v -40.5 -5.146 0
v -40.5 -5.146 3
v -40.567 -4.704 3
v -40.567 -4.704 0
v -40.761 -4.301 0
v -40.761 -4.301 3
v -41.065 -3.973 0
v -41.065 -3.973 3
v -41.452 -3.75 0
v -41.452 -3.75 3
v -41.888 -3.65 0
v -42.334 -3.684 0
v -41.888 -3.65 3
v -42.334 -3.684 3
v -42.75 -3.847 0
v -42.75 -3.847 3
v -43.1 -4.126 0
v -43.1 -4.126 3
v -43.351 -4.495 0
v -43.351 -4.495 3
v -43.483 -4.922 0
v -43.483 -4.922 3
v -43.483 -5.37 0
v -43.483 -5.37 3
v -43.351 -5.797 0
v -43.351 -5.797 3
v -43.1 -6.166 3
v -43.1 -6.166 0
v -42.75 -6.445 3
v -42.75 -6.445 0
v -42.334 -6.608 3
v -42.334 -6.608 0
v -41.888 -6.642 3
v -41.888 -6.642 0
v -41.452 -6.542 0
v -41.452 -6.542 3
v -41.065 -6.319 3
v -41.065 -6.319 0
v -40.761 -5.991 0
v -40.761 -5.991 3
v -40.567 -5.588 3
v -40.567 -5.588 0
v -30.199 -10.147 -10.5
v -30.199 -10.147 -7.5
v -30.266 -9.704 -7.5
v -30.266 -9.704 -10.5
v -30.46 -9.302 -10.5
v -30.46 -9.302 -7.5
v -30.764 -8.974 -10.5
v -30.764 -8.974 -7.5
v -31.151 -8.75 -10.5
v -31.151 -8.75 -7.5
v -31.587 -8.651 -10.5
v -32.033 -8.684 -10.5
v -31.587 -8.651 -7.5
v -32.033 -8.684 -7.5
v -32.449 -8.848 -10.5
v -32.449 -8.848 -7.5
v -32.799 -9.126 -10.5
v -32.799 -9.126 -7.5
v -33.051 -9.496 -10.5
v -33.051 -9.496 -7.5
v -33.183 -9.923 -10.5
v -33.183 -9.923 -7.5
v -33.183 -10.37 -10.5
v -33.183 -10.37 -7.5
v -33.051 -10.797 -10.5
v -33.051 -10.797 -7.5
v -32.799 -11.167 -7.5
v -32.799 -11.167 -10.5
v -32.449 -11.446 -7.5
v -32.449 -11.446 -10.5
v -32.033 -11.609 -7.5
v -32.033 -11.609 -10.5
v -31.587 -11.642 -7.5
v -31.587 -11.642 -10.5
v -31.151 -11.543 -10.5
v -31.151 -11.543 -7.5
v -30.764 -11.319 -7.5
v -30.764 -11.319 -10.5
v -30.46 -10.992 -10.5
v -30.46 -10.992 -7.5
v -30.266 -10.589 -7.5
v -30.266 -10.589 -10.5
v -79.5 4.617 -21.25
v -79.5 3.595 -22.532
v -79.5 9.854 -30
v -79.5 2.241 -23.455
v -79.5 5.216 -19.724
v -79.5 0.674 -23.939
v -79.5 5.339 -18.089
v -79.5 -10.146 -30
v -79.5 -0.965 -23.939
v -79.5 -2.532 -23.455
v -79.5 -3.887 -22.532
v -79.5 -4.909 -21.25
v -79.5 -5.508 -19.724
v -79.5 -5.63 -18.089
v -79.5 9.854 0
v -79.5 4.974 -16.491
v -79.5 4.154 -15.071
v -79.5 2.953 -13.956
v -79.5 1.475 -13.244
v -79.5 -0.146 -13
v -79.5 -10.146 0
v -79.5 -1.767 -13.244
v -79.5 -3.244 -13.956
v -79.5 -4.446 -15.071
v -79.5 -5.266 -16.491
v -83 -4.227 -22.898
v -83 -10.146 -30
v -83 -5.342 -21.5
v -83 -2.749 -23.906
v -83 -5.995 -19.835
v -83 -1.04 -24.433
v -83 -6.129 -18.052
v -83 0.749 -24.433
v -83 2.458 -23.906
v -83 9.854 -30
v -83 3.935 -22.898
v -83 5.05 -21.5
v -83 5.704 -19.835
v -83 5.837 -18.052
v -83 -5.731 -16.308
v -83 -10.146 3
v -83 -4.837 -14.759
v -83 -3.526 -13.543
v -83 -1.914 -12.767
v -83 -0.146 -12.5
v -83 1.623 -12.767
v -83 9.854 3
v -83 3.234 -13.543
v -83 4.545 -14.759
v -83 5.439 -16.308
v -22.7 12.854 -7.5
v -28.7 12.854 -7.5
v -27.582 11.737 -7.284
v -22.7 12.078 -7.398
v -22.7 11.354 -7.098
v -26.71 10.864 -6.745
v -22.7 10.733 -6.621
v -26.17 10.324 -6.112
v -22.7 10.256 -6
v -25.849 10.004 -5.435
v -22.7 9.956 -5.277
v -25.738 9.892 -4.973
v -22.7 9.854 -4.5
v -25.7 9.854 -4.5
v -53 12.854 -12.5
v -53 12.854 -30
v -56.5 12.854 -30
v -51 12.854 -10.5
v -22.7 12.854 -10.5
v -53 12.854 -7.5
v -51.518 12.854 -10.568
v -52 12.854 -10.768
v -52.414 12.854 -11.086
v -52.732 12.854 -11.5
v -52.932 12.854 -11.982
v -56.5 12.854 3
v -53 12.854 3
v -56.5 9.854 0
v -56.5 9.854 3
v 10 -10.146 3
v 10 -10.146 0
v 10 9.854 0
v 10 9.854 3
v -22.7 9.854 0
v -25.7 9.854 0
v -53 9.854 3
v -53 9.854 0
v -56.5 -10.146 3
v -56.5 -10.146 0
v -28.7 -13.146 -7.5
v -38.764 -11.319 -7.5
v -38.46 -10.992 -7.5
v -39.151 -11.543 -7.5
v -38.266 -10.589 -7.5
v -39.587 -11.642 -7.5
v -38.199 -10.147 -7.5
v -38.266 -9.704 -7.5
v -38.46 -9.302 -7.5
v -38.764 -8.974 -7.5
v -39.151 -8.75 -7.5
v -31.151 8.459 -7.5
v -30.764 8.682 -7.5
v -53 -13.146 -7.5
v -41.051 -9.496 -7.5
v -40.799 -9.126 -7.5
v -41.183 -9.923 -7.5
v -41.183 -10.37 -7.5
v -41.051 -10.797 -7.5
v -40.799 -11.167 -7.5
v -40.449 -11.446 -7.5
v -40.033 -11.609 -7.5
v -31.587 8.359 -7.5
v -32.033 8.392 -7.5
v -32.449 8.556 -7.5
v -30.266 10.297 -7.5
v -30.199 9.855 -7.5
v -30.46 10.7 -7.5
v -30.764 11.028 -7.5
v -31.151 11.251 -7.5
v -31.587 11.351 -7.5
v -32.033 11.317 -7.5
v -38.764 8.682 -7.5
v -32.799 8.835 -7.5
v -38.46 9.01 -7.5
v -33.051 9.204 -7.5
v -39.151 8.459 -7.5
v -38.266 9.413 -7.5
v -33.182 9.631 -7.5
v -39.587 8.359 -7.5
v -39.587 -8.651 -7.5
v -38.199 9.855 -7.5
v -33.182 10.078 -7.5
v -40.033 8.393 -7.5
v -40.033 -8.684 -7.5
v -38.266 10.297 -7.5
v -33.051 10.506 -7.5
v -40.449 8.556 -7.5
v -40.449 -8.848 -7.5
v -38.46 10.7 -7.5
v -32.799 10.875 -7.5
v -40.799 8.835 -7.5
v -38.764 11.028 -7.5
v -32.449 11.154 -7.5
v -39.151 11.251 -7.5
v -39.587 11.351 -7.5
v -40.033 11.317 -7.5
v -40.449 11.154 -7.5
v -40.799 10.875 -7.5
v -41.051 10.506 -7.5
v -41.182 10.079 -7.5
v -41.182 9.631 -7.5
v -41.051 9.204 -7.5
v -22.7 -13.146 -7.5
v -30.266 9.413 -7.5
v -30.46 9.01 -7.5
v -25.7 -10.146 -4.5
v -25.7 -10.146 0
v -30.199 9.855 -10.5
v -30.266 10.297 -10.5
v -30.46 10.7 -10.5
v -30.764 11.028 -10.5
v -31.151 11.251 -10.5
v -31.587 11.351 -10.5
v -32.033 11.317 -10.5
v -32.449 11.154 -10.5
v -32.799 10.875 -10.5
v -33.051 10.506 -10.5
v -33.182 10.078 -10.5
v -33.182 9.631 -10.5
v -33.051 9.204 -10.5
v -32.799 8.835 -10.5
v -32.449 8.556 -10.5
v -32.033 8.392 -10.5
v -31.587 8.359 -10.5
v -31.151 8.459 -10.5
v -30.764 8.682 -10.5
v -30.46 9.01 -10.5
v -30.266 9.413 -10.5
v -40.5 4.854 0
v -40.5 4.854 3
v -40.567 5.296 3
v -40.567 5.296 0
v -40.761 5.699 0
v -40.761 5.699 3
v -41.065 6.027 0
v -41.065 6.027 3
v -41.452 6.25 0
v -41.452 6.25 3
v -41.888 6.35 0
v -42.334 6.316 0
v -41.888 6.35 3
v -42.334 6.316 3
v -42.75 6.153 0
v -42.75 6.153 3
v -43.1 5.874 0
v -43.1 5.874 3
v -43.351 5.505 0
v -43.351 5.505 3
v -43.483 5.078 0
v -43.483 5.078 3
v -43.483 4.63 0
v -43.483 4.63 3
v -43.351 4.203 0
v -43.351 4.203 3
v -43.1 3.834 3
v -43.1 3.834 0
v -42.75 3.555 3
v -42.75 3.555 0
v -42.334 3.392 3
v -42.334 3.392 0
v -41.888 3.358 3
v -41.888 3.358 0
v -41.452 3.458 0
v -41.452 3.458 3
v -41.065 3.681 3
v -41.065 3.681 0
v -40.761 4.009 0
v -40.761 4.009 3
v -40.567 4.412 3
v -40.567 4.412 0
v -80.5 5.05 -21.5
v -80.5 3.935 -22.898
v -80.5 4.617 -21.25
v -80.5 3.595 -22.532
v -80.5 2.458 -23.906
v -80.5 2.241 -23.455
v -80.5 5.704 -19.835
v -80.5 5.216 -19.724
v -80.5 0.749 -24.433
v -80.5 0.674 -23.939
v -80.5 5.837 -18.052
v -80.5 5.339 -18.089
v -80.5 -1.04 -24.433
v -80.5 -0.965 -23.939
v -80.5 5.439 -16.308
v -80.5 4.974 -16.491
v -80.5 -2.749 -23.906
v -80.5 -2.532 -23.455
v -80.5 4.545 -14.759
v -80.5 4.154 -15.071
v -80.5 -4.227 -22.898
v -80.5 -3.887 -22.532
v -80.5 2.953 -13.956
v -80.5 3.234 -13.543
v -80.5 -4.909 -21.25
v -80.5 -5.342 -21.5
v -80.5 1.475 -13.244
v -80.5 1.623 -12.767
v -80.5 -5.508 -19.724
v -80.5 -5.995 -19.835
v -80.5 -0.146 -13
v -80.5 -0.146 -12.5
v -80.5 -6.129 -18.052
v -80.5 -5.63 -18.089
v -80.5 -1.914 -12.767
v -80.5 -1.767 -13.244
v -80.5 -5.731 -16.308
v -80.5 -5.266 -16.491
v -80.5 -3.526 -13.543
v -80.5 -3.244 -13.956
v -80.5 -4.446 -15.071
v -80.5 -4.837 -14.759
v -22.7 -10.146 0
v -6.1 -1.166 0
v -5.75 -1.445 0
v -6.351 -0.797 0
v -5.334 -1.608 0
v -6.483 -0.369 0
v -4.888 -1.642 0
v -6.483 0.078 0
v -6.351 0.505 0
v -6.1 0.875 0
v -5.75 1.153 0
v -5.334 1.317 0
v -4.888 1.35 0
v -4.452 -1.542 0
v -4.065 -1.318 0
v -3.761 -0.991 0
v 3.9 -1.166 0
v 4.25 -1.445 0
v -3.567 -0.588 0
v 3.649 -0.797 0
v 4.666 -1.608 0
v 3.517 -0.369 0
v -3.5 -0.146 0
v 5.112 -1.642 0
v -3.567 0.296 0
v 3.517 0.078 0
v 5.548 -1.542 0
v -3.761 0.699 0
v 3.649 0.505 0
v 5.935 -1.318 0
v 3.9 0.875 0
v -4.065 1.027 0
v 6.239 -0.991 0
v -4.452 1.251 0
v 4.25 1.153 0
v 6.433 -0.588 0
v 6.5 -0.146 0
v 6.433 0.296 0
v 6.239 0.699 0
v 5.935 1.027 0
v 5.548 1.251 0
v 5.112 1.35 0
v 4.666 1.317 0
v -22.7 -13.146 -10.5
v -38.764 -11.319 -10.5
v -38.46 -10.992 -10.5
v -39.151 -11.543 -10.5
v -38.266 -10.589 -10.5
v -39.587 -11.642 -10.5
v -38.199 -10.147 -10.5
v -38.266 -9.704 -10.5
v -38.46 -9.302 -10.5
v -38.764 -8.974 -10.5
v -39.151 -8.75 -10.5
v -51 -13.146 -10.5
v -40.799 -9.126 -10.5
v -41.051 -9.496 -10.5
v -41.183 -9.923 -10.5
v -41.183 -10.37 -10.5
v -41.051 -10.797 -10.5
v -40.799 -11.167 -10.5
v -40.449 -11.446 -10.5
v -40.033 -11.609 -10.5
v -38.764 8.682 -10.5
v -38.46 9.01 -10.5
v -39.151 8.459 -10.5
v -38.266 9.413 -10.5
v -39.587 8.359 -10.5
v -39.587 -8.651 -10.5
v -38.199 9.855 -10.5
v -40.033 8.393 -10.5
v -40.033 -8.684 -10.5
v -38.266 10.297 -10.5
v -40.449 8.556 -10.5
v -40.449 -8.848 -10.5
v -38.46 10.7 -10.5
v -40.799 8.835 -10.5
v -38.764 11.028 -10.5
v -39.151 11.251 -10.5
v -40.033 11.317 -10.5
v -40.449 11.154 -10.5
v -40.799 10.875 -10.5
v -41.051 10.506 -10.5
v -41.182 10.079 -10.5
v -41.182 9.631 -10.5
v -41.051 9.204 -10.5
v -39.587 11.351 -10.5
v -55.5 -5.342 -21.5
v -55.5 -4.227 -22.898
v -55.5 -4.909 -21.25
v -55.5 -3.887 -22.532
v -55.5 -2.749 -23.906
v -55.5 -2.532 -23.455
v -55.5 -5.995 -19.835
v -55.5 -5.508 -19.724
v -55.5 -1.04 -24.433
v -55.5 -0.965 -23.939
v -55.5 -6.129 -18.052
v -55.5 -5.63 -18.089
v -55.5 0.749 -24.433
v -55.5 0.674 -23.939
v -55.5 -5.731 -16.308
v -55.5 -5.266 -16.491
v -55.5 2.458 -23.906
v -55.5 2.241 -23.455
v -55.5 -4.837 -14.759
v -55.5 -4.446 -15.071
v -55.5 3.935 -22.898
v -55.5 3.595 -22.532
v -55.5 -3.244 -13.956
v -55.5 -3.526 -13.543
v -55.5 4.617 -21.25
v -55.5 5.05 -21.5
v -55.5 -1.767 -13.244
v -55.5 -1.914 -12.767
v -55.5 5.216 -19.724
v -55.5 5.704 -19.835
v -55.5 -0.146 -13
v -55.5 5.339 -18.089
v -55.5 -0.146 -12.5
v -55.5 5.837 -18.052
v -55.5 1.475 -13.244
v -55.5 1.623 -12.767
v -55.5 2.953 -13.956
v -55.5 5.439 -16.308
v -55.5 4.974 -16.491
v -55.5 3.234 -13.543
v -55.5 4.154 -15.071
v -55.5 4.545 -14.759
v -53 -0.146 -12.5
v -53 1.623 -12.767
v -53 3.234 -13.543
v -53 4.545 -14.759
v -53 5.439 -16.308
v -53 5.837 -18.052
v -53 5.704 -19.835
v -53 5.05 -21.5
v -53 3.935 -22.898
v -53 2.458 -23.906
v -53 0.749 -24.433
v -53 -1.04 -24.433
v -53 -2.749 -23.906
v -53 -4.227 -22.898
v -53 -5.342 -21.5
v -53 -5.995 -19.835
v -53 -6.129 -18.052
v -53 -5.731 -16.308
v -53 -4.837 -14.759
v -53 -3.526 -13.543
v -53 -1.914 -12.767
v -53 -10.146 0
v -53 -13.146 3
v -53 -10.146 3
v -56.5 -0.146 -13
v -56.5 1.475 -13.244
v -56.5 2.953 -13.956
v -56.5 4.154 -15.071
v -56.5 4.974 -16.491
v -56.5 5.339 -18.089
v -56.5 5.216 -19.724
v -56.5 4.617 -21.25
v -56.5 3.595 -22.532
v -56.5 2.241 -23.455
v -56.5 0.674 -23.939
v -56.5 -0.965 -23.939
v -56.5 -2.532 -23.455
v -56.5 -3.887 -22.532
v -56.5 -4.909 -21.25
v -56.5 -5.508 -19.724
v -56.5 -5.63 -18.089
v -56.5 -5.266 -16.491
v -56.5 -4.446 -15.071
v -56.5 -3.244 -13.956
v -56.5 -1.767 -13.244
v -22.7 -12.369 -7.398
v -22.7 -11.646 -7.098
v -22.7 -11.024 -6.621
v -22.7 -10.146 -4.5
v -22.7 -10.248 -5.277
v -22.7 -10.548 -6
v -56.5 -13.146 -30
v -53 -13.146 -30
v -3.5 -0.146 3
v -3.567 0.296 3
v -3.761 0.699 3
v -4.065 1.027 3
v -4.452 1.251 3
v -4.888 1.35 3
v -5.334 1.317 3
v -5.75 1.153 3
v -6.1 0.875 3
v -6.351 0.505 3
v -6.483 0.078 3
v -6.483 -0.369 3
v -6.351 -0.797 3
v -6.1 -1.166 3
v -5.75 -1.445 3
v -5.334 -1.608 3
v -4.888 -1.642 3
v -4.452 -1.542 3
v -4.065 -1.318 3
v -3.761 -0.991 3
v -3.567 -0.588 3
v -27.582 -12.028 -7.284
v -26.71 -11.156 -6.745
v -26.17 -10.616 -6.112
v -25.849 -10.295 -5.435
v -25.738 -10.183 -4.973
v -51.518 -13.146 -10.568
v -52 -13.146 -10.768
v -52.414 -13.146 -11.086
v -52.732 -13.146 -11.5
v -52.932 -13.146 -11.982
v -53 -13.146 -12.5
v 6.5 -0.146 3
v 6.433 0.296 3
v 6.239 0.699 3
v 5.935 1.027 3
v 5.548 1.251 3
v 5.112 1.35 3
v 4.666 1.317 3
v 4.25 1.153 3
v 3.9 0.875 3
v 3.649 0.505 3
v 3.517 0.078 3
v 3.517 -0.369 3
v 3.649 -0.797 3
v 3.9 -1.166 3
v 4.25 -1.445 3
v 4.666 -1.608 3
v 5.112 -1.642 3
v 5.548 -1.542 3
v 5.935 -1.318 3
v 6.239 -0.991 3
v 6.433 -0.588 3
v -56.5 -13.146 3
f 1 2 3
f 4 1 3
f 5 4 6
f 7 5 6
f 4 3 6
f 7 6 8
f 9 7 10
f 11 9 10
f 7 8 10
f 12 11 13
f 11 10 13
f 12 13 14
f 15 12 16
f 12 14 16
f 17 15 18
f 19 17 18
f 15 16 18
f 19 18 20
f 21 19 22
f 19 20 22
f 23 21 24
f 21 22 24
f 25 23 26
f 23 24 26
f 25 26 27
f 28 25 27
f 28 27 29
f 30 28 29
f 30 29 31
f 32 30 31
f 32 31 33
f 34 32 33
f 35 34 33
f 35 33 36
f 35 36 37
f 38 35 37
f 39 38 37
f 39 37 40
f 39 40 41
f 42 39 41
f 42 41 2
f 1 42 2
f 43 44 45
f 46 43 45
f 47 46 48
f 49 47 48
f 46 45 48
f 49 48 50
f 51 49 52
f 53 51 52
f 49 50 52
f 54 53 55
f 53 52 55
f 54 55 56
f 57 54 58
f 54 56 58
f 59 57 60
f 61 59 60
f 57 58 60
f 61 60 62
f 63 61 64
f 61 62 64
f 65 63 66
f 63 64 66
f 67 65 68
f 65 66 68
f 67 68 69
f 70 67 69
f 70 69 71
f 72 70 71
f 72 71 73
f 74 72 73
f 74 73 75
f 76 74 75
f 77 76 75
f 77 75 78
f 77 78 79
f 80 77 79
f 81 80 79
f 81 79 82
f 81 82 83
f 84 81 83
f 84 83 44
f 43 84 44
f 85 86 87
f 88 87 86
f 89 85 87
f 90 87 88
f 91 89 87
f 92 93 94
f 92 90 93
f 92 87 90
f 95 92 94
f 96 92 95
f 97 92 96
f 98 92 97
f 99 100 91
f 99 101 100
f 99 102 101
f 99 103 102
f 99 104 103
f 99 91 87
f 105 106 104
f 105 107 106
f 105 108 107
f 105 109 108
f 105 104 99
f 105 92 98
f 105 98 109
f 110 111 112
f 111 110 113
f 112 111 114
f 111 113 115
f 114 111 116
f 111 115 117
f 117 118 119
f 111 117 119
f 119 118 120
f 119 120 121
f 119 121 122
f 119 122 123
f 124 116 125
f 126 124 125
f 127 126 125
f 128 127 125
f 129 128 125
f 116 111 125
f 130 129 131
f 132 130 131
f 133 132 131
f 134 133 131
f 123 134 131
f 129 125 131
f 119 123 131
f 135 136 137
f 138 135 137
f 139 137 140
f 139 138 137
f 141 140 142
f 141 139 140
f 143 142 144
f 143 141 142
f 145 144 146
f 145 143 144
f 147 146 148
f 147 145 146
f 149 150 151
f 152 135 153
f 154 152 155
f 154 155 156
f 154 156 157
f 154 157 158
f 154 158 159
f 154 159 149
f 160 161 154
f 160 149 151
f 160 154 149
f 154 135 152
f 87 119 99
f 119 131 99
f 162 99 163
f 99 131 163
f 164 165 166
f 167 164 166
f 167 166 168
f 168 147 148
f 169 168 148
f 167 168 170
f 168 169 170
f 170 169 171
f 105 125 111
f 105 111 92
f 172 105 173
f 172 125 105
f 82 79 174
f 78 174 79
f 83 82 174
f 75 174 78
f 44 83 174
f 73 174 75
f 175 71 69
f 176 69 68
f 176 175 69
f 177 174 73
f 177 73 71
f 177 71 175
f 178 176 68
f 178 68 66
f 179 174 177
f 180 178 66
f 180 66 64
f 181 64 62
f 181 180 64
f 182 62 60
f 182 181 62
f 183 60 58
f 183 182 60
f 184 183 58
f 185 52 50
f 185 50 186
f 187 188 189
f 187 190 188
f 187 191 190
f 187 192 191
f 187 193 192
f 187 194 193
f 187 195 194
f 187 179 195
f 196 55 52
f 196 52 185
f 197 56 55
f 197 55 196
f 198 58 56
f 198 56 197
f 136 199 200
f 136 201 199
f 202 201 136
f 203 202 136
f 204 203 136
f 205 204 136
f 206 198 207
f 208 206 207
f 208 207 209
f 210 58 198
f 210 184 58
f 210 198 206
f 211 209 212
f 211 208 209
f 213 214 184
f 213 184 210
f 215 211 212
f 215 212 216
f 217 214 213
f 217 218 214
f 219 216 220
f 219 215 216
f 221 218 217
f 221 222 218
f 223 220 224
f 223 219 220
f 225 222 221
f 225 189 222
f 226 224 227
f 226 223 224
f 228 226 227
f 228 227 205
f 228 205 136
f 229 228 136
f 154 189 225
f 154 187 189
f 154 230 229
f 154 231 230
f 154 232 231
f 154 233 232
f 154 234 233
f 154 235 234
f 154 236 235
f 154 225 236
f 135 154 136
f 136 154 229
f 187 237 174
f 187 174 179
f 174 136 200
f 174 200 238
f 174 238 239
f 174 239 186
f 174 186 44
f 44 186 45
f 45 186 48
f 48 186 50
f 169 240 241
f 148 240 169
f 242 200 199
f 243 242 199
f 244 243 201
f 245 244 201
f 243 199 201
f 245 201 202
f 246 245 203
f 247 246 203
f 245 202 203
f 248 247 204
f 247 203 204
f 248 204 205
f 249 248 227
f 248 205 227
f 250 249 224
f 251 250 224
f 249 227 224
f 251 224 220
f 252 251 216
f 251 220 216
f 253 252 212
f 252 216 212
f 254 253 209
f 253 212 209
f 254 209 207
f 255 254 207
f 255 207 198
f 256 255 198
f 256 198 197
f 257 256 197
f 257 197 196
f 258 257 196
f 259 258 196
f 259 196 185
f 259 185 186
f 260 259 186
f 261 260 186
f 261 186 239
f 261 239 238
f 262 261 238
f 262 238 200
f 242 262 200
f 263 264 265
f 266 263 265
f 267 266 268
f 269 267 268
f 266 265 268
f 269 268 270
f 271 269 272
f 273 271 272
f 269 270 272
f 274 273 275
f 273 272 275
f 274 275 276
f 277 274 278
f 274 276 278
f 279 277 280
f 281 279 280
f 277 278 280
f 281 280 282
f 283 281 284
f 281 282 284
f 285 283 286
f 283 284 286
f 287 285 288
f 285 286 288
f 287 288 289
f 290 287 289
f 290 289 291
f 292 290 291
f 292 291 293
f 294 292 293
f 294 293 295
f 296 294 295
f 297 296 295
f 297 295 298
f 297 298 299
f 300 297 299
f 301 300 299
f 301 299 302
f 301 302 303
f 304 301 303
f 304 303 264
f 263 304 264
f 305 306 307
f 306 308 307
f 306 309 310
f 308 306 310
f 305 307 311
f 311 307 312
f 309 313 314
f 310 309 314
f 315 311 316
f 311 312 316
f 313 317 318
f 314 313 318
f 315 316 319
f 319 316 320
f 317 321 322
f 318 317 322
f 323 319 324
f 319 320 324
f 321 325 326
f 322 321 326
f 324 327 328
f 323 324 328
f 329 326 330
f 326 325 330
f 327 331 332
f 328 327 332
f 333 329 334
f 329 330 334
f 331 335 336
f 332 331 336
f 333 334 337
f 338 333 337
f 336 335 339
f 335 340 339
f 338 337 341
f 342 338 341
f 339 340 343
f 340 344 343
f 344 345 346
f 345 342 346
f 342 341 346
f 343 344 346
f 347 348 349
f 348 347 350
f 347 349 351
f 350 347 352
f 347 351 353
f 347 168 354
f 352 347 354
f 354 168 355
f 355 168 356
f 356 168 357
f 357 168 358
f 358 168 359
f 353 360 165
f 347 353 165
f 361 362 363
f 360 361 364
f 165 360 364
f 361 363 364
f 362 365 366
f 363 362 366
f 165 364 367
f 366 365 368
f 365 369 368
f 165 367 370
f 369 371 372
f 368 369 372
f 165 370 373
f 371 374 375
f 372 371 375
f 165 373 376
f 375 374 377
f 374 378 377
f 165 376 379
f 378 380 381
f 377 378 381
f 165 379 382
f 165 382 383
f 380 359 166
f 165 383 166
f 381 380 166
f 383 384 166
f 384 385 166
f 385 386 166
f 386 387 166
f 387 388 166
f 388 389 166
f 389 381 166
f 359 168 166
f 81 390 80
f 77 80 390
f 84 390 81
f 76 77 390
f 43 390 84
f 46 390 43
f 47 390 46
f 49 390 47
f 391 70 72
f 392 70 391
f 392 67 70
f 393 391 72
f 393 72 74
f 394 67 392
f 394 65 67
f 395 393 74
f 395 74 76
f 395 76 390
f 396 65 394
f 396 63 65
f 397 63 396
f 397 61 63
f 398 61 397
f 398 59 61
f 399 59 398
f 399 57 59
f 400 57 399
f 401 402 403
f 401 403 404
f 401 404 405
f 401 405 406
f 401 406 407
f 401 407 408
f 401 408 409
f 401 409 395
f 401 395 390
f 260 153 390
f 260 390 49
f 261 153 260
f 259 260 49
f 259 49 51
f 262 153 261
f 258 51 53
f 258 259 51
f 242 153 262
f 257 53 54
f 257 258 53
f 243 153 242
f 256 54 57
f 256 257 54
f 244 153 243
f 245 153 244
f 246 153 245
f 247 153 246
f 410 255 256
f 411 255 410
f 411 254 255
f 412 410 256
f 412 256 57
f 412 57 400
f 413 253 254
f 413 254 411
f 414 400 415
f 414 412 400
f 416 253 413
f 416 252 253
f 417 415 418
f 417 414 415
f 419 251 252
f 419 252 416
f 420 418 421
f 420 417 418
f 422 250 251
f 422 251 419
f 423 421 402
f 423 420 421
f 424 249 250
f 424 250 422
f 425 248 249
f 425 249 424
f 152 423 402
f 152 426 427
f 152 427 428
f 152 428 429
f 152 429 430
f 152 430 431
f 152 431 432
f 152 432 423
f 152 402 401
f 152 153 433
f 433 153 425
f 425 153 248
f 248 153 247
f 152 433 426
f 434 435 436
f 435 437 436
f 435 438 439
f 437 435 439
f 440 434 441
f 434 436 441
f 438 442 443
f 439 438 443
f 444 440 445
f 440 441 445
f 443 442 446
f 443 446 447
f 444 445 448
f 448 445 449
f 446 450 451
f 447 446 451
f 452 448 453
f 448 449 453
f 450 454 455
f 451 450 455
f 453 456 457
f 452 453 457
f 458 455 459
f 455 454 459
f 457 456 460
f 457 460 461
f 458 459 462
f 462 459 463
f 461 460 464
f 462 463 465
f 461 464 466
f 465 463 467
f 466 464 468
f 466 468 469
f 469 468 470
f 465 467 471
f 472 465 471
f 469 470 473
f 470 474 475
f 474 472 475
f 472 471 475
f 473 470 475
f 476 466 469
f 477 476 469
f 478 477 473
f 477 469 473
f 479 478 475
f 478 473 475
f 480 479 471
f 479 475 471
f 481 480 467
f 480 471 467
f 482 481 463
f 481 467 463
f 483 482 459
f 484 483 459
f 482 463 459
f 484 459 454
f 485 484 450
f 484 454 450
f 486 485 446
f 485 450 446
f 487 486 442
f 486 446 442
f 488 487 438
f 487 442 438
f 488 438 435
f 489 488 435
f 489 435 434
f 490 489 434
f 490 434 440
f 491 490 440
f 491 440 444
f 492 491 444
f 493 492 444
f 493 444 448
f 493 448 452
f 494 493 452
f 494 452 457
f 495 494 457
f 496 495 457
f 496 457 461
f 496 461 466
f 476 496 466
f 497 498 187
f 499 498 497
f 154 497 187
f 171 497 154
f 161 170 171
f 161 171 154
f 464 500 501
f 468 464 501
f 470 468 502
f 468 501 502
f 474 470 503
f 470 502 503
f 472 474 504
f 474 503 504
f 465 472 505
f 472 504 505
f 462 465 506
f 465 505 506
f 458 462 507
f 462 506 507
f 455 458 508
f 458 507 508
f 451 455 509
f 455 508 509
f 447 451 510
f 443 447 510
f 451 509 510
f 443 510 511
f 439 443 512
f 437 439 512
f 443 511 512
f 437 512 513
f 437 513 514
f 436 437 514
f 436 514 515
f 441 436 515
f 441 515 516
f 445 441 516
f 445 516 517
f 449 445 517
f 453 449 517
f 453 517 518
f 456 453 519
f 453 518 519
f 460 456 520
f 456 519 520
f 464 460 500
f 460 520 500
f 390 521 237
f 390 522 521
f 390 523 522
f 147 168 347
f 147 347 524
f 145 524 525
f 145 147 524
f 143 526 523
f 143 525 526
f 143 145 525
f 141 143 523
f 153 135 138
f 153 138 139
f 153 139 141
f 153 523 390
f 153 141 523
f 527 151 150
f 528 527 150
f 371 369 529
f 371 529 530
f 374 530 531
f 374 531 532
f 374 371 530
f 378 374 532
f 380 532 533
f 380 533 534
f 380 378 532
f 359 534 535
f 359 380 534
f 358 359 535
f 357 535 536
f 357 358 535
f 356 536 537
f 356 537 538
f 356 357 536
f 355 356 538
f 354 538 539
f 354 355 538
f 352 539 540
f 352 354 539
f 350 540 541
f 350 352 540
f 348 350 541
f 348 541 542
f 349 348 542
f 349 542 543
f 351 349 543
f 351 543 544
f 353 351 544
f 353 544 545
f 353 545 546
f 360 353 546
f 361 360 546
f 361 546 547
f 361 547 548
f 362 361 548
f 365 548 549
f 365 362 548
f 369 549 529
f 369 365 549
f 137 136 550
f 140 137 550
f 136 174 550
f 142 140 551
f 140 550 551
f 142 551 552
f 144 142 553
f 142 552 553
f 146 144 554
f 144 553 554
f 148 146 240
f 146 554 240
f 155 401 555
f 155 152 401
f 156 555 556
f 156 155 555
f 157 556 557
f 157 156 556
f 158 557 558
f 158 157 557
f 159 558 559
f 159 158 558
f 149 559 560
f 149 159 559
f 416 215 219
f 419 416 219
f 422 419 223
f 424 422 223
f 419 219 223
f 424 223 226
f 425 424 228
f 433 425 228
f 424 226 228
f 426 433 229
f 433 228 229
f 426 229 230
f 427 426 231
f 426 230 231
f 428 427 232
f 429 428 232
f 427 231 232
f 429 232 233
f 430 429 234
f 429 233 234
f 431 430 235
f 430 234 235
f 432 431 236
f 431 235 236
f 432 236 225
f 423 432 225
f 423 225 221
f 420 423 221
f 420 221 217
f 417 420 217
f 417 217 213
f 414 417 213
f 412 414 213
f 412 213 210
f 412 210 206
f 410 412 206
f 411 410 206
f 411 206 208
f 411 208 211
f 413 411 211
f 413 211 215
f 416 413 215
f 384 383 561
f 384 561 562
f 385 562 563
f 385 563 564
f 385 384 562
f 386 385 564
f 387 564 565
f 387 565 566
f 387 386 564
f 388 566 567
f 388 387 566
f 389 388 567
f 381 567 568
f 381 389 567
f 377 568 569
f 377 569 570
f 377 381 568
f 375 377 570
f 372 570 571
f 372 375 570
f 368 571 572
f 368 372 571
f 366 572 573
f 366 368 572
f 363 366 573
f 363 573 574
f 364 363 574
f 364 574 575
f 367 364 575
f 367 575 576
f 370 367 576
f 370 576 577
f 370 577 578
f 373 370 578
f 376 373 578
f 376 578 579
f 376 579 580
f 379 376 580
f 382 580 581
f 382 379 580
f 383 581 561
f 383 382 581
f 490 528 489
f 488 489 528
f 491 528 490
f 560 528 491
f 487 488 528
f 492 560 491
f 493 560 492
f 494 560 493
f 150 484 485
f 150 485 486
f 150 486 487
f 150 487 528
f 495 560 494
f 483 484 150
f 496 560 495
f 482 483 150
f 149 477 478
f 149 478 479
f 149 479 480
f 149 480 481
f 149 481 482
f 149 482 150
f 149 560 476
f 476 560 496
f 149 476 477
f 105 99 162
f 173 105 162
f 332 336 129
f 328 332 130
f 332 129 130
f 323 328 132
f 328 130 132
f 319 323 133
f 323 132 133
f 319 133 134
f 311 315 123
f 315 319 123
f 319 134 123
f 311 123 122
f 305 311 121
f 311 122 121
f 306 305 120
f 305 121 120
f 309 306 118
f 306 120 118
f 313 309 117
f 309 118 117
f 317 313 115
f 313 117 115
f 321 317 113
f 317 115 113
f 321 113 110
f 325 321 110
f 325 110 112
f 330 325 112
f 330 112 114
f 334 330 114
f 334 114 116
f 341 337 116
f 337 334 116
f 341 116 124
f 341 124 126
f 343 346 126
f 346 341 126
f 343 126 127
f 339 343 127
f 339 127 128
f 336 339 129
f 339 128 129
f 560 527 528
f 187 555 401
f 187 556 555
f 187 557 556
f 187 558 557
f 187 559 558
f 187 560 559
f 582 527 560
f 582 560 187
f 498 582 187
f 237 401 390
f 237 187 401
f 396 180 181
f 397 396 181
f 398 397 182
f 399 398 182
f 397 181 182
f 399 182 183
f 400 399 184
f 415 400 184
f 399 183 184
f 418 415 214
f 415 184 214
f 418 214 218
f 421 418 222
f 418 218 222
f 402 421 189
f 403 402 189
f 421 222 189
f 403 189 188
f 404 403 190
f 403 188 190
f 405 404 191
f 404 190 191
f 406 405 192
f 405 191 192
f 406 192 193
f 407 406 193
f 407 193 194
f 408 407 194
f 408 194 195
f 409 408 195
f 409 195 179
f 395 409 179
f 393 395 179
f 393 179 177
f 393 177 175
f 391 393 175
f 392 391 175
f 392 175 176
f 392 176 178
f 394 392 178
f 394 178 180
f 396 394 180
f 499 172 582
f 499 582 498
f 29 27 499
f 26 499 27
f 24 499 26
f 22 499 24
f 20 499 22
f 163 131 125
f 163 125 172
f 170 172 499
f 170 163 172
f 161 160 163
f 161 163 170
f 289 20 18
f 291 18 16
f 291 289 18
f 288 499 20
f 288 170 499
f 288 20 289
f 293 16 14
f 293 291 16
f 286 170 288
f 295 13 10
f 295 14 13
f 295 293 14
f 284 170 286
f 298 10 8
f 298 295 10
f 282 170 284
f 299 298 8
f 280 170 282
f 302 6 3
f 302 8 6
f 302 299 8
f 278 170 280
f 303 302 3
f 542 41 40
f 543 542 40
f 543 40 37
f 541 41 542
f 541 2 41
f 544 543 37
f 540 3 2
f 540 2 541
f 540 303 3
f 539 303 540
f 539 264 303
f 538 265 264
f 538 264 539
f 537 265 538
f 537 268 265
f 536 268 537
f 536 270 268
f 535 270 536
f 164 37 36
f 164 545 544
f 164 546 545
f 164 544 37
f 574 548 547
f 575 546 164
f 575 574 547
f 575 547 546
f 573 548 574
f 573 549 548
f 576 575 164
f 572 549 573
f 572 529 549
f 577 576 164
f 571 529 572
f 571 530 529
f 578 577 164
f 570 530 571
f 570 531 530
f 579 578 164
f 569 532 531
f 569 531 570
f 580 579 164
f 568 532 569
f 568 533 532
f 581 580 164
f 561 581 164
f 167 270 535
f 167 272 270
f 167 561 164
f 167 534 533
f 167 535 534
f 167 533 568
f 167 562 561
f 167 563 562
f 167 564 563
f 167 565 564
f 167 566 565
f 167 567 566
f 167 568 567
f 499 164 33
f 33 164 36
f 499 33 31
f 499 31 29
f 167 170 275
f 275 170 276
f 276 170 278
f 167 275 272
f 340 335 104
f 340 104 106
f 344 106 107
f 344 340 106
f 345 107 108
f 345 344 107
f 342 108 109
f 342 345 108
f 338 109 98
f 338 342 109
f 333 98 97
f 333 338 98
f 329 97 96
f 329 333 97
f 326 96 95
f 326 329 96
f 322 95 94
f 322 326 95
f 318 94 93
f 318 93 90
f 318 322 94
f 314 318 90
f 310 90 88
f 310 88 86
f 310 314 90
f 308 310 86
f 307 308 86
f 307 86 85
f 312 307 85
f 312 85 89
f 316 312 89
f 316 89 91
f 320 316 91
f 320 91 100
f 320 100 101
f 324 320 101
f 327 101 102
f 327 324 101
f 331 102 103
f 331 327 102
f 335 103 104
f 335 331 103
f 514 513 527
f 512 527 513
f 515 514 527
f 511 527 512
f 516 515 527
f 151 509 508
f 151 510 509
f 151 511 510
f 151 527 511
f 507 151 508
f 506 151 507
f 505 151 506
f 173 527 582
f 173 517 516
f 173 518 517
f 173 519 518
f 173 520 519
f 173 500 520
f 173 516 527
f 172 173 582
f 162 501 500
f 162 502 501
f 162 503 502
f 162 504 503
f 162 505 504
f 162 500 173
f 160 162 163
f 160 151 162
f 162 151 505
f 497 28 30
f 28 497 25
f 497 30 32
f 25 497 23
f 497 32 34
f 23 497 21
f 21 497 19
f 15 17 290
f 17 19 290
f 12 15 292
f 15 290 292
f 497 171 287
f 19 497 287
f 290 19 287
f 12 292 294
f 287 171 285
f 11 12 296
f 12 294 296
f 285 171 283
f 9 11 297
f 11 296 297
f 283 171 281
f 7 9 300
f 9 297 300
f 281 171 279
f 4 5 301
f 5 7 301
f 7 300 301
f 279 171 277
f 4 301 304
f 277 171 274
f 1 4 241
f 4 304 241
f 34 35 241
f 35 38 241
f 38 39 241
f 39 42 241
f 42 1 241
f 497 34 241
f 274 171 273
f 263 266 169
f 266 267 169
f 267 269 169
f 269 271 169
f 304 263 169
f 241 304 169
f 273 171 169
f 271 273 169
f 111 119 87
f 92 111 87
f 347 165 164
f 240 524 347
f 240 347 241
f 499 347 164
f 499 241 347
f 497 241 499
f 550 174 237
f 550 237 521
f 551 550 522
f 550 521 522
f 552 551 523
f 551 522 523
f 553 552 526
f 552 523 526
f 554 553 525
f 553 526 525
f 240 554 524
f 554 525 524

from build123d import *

# Parameters (mm, degrees)
SKETCH_1_W          = 20
SKETCH_1_H          = 20
SKETCH_1_R          = 1.5
SKETCH_1_W_2        = 23
SKETCH_1_W_3        = 3.5
EXTRUDE_1_DEPTH     = 3
EXTRUDE_2_DEPTH     = 30
SKETCH_1_4_W        = 3.5
SKETCH_1_4_H        = 20
EXTRUDE_3_DEPTH     = 30
SKETCH_3_R          = 6
CUT_EXTRUDE_2_DEPTH = 38
SKETCH_4_R          = 6
SKETCH_4_R_2        = 5.5
EXTRUDE_4_DEPTH     = 1
EXTRUDE_START       = -1
SKETCH_5_R          = 6
SKETCH_5_R_2        = 5.5
EXTRUDE_5_DEPTH     = 1
SKETCH_7_R          = 1.5
CUT_EXTRUDE_4_DEPTH = 5
SKETCH_9_W          = 3
SKETCH_9_H          = 26
EXTRUDE_6_DEPTH     = 30.3
SKETCH_10_R         = 1.5
CUT_EXTRUDE_6_DEPTH = 10
FILLET_2_R          = 2
SKETCH_13_W         = 3
SKETCH_13_H         = 20
EXTRUDE_8_DEPTH     = 10.5
FILLET_5_R          = 3


with BuildPart() as part:
    # 草图1 → 凸台-拉伸1 (new body)
    # profile 1 of 5: a face of its own
    with BuildSketch(Plane.XY):
        Polygon((-10, -10.145751311), (-10, 9.854248689), (-53, 9.854248689), (-53, -0.145751311), (-53, -10.145751311), align=None)
    # profile 2 of 5: a face of its own
    with BuildSketch(Plane.XY):
        with Locations((0, -0.145751311)):
            Rectangle(SKETCH_1_W, SKETCH_1_H)
        with Locations((-5, -0.145751311)):
            Circle(SKETCH_1_R, mode=Mode.SUBTRACT)
        with Locations((5, -0.145751311)):
            Circle(SKETCH_1_R, mode=Mode.SUBTRACT)
    # profile 3 of 5: a face of its own
    with BuildSketch(Plane.XY):
        Polygon((-53, -0.145751311), (-53, 9.854248689), (-53, 12.854248689), (-56.5, 12.854248689), (-56.5, 9.854248689), (-56.5, -10.145751311), (-56.5, -13.145751311), (-53, -13.145751311), (-53, -10.145751311), align=None)
    # profile 4 of 5: a face of its own
    with BuildSketch(Plane.XY):
        with Locations((-68, -0.145751311)):
            Rectangle(SKETCH_1_W_2, SKETCH_1_H)
    # profile 5 of 5: a face of its own
    with BuildSketch(Plane.XY):
        with Locations((-81.25, -0.145751311)):
            Rectangle(SKETCH_1_W_3, SKETCH_1_H)
    extrude(amount=EXTRUDE_1_DEPTH)

    # 草图1<3> → 凸台-拉伸2 (add)
    with BuildSketch(Plane.XY):
        Polygon((-53, -0.145751311), (-53, 9.854248689), (-53, 12.854248689), (-56.5, 12.854248689), (-56.5, 9.854248689), (-56.5, -10.145751311), (-56.5, -13.145751311), (-53, -13.145751311), (-53, -10.145751311), align=None)
    extrude(amount=-EXTRUDE_2_DEPTH)

    # 草图1<4> → 凸台-拉伸3 (add)
    with BuildSketch(Plane.XY):
        with Locations((-81.25, -0.145751311)):
            Rectangle(SKETCH_1_4_W, SKETCH_1_4_H)
    extrude(amount=-EXTRUDE_3_DEPTH)

    # 草图3 → 切除-拉伸2 (cut)
    with BuildSketch(Plane.ZY.offset(83)):
        with Locations((-18.5, -0.145751311)):
            Circle(SKETCH_3_R)
    extrude(amount=-CUT_EXTRUDE_2_DEPTH, mode=Mode.SUBTRACT)

    # 草图4 → 凸台-拉伸4 (add)
    with BuildSketch(Plane.ZY.offset(56.5)):
        with Locations((-18.5, -0.145751311)):
            Circle(SKETCH_4_R)
        with Locations((-18.5, -0.145751311)):
            Circle(SKETCH_4_R_2, mode=Mode.SUBTRACT)
    extrude(amount=-EXTRUDE_4_DEPTH)

    # 草图5 → 凸台-拉伸5 (add)
    with BuildSketch(Plane(origin=(-79.5, 0, 0), x_dir=(0, 0, -1), z_dir=(1, 0, 0)).offset(EXTRUDE_START)):
        with Locations(Location((18.5, -0.145751311, 0), (0, 0, 180))):
            Circle(SKETCH_5_R)
        with Locations(Location((18.5, -0.145751311, 0), (0, 0, 180))):
            Circle(SKETCH_5_R_2, mode=Mode.SUBTRACT)
    extrude(amount=EXTRUDE_5_DEPTH)

    # 草图7 → 切除-拉伸4 (cut)
    with BuildSketch(Plane.XY.offset(3)):
        with Locations((-42, 4.853948946)):
            Circle(SKETCH_7_R)
        with Locations((-42, -5.146051054)):
            Circle(SKETCH_7_R)
    extrude(amount=-CUT_EXTRUDE_4_DEPTH, mode=Mode.SUBTRACT)

    # 草图9 → 凸台-拉伸6 (add)
    with BuildSketch(Plane(origin=(-53, 0, 0), x_dir=(0, 0, -1), z_dir=(1, 0, 0))):
        with Locations((9, -0.145751311)):
            Rectangle(SKETCH_9_W, SKETCH_9_H)
    extrude(amount=EXTRUDE_6_DEPTH)

    # 草图10 → 切除-拉伸6 (cut)
    with BuildSketch(Plane.XY.offset(-7.5)):
        with Locations((-31.699132707, 9.854844931)):
            Circle(SKETCH_10_R)
        with Locations((-39.699132705, 9.855007549)):
            Circle(SKETCH_10_R)
        with Locations((-31.699403758, -10.146618604)):
            Circle(SKETCH_10_R)
        with Locations((-39.699403758, -10.146618604)):
            Circle(SKETCH_10_R)
    extrude(amount=-CUT_EXTRUDE_6_DEPTH, mode=Mode.SUBTRACT)

    # 圆角2
    fillet_2_edges = [part.edges().sort_by_distance(p)[0] for p in [
        (-53, -0.145751311, -10.5),
    ]]
    fillet(fillet_2_edges, radius=FILLET_2_R - 0.0001)  # a hair under: the kernel refuses the full size

    # 草图13 → 凸台-拉伸8 (add)
    with BuildSketch(Plane(origin=(0, 0, -10.5), x_dir=(-1, 0, 0), z_dir=(0, 0, -1))):
        with Locations((24.2, -0.145751311)):
            Rectangle(SKETCH_13_W, SKETCH_13_H)
    extrude(amount=-EXTRUDE_8_DEPTH)

    # 圆角5
    fillet_5_edges = [part.edges().sort_by_distance(p)[0] for p in [
        (-24.2, 9.854248689, -7.5),
        (-25.7, -0.145751311, -7.5),
        (-24.2, -10.145751311, -7.5),
    ]]
    fillet(fillet_5_edges, radius=FILLET_5_R - 0.0001)  # a hair under: the kernel refuses the full size


solid = part.part
